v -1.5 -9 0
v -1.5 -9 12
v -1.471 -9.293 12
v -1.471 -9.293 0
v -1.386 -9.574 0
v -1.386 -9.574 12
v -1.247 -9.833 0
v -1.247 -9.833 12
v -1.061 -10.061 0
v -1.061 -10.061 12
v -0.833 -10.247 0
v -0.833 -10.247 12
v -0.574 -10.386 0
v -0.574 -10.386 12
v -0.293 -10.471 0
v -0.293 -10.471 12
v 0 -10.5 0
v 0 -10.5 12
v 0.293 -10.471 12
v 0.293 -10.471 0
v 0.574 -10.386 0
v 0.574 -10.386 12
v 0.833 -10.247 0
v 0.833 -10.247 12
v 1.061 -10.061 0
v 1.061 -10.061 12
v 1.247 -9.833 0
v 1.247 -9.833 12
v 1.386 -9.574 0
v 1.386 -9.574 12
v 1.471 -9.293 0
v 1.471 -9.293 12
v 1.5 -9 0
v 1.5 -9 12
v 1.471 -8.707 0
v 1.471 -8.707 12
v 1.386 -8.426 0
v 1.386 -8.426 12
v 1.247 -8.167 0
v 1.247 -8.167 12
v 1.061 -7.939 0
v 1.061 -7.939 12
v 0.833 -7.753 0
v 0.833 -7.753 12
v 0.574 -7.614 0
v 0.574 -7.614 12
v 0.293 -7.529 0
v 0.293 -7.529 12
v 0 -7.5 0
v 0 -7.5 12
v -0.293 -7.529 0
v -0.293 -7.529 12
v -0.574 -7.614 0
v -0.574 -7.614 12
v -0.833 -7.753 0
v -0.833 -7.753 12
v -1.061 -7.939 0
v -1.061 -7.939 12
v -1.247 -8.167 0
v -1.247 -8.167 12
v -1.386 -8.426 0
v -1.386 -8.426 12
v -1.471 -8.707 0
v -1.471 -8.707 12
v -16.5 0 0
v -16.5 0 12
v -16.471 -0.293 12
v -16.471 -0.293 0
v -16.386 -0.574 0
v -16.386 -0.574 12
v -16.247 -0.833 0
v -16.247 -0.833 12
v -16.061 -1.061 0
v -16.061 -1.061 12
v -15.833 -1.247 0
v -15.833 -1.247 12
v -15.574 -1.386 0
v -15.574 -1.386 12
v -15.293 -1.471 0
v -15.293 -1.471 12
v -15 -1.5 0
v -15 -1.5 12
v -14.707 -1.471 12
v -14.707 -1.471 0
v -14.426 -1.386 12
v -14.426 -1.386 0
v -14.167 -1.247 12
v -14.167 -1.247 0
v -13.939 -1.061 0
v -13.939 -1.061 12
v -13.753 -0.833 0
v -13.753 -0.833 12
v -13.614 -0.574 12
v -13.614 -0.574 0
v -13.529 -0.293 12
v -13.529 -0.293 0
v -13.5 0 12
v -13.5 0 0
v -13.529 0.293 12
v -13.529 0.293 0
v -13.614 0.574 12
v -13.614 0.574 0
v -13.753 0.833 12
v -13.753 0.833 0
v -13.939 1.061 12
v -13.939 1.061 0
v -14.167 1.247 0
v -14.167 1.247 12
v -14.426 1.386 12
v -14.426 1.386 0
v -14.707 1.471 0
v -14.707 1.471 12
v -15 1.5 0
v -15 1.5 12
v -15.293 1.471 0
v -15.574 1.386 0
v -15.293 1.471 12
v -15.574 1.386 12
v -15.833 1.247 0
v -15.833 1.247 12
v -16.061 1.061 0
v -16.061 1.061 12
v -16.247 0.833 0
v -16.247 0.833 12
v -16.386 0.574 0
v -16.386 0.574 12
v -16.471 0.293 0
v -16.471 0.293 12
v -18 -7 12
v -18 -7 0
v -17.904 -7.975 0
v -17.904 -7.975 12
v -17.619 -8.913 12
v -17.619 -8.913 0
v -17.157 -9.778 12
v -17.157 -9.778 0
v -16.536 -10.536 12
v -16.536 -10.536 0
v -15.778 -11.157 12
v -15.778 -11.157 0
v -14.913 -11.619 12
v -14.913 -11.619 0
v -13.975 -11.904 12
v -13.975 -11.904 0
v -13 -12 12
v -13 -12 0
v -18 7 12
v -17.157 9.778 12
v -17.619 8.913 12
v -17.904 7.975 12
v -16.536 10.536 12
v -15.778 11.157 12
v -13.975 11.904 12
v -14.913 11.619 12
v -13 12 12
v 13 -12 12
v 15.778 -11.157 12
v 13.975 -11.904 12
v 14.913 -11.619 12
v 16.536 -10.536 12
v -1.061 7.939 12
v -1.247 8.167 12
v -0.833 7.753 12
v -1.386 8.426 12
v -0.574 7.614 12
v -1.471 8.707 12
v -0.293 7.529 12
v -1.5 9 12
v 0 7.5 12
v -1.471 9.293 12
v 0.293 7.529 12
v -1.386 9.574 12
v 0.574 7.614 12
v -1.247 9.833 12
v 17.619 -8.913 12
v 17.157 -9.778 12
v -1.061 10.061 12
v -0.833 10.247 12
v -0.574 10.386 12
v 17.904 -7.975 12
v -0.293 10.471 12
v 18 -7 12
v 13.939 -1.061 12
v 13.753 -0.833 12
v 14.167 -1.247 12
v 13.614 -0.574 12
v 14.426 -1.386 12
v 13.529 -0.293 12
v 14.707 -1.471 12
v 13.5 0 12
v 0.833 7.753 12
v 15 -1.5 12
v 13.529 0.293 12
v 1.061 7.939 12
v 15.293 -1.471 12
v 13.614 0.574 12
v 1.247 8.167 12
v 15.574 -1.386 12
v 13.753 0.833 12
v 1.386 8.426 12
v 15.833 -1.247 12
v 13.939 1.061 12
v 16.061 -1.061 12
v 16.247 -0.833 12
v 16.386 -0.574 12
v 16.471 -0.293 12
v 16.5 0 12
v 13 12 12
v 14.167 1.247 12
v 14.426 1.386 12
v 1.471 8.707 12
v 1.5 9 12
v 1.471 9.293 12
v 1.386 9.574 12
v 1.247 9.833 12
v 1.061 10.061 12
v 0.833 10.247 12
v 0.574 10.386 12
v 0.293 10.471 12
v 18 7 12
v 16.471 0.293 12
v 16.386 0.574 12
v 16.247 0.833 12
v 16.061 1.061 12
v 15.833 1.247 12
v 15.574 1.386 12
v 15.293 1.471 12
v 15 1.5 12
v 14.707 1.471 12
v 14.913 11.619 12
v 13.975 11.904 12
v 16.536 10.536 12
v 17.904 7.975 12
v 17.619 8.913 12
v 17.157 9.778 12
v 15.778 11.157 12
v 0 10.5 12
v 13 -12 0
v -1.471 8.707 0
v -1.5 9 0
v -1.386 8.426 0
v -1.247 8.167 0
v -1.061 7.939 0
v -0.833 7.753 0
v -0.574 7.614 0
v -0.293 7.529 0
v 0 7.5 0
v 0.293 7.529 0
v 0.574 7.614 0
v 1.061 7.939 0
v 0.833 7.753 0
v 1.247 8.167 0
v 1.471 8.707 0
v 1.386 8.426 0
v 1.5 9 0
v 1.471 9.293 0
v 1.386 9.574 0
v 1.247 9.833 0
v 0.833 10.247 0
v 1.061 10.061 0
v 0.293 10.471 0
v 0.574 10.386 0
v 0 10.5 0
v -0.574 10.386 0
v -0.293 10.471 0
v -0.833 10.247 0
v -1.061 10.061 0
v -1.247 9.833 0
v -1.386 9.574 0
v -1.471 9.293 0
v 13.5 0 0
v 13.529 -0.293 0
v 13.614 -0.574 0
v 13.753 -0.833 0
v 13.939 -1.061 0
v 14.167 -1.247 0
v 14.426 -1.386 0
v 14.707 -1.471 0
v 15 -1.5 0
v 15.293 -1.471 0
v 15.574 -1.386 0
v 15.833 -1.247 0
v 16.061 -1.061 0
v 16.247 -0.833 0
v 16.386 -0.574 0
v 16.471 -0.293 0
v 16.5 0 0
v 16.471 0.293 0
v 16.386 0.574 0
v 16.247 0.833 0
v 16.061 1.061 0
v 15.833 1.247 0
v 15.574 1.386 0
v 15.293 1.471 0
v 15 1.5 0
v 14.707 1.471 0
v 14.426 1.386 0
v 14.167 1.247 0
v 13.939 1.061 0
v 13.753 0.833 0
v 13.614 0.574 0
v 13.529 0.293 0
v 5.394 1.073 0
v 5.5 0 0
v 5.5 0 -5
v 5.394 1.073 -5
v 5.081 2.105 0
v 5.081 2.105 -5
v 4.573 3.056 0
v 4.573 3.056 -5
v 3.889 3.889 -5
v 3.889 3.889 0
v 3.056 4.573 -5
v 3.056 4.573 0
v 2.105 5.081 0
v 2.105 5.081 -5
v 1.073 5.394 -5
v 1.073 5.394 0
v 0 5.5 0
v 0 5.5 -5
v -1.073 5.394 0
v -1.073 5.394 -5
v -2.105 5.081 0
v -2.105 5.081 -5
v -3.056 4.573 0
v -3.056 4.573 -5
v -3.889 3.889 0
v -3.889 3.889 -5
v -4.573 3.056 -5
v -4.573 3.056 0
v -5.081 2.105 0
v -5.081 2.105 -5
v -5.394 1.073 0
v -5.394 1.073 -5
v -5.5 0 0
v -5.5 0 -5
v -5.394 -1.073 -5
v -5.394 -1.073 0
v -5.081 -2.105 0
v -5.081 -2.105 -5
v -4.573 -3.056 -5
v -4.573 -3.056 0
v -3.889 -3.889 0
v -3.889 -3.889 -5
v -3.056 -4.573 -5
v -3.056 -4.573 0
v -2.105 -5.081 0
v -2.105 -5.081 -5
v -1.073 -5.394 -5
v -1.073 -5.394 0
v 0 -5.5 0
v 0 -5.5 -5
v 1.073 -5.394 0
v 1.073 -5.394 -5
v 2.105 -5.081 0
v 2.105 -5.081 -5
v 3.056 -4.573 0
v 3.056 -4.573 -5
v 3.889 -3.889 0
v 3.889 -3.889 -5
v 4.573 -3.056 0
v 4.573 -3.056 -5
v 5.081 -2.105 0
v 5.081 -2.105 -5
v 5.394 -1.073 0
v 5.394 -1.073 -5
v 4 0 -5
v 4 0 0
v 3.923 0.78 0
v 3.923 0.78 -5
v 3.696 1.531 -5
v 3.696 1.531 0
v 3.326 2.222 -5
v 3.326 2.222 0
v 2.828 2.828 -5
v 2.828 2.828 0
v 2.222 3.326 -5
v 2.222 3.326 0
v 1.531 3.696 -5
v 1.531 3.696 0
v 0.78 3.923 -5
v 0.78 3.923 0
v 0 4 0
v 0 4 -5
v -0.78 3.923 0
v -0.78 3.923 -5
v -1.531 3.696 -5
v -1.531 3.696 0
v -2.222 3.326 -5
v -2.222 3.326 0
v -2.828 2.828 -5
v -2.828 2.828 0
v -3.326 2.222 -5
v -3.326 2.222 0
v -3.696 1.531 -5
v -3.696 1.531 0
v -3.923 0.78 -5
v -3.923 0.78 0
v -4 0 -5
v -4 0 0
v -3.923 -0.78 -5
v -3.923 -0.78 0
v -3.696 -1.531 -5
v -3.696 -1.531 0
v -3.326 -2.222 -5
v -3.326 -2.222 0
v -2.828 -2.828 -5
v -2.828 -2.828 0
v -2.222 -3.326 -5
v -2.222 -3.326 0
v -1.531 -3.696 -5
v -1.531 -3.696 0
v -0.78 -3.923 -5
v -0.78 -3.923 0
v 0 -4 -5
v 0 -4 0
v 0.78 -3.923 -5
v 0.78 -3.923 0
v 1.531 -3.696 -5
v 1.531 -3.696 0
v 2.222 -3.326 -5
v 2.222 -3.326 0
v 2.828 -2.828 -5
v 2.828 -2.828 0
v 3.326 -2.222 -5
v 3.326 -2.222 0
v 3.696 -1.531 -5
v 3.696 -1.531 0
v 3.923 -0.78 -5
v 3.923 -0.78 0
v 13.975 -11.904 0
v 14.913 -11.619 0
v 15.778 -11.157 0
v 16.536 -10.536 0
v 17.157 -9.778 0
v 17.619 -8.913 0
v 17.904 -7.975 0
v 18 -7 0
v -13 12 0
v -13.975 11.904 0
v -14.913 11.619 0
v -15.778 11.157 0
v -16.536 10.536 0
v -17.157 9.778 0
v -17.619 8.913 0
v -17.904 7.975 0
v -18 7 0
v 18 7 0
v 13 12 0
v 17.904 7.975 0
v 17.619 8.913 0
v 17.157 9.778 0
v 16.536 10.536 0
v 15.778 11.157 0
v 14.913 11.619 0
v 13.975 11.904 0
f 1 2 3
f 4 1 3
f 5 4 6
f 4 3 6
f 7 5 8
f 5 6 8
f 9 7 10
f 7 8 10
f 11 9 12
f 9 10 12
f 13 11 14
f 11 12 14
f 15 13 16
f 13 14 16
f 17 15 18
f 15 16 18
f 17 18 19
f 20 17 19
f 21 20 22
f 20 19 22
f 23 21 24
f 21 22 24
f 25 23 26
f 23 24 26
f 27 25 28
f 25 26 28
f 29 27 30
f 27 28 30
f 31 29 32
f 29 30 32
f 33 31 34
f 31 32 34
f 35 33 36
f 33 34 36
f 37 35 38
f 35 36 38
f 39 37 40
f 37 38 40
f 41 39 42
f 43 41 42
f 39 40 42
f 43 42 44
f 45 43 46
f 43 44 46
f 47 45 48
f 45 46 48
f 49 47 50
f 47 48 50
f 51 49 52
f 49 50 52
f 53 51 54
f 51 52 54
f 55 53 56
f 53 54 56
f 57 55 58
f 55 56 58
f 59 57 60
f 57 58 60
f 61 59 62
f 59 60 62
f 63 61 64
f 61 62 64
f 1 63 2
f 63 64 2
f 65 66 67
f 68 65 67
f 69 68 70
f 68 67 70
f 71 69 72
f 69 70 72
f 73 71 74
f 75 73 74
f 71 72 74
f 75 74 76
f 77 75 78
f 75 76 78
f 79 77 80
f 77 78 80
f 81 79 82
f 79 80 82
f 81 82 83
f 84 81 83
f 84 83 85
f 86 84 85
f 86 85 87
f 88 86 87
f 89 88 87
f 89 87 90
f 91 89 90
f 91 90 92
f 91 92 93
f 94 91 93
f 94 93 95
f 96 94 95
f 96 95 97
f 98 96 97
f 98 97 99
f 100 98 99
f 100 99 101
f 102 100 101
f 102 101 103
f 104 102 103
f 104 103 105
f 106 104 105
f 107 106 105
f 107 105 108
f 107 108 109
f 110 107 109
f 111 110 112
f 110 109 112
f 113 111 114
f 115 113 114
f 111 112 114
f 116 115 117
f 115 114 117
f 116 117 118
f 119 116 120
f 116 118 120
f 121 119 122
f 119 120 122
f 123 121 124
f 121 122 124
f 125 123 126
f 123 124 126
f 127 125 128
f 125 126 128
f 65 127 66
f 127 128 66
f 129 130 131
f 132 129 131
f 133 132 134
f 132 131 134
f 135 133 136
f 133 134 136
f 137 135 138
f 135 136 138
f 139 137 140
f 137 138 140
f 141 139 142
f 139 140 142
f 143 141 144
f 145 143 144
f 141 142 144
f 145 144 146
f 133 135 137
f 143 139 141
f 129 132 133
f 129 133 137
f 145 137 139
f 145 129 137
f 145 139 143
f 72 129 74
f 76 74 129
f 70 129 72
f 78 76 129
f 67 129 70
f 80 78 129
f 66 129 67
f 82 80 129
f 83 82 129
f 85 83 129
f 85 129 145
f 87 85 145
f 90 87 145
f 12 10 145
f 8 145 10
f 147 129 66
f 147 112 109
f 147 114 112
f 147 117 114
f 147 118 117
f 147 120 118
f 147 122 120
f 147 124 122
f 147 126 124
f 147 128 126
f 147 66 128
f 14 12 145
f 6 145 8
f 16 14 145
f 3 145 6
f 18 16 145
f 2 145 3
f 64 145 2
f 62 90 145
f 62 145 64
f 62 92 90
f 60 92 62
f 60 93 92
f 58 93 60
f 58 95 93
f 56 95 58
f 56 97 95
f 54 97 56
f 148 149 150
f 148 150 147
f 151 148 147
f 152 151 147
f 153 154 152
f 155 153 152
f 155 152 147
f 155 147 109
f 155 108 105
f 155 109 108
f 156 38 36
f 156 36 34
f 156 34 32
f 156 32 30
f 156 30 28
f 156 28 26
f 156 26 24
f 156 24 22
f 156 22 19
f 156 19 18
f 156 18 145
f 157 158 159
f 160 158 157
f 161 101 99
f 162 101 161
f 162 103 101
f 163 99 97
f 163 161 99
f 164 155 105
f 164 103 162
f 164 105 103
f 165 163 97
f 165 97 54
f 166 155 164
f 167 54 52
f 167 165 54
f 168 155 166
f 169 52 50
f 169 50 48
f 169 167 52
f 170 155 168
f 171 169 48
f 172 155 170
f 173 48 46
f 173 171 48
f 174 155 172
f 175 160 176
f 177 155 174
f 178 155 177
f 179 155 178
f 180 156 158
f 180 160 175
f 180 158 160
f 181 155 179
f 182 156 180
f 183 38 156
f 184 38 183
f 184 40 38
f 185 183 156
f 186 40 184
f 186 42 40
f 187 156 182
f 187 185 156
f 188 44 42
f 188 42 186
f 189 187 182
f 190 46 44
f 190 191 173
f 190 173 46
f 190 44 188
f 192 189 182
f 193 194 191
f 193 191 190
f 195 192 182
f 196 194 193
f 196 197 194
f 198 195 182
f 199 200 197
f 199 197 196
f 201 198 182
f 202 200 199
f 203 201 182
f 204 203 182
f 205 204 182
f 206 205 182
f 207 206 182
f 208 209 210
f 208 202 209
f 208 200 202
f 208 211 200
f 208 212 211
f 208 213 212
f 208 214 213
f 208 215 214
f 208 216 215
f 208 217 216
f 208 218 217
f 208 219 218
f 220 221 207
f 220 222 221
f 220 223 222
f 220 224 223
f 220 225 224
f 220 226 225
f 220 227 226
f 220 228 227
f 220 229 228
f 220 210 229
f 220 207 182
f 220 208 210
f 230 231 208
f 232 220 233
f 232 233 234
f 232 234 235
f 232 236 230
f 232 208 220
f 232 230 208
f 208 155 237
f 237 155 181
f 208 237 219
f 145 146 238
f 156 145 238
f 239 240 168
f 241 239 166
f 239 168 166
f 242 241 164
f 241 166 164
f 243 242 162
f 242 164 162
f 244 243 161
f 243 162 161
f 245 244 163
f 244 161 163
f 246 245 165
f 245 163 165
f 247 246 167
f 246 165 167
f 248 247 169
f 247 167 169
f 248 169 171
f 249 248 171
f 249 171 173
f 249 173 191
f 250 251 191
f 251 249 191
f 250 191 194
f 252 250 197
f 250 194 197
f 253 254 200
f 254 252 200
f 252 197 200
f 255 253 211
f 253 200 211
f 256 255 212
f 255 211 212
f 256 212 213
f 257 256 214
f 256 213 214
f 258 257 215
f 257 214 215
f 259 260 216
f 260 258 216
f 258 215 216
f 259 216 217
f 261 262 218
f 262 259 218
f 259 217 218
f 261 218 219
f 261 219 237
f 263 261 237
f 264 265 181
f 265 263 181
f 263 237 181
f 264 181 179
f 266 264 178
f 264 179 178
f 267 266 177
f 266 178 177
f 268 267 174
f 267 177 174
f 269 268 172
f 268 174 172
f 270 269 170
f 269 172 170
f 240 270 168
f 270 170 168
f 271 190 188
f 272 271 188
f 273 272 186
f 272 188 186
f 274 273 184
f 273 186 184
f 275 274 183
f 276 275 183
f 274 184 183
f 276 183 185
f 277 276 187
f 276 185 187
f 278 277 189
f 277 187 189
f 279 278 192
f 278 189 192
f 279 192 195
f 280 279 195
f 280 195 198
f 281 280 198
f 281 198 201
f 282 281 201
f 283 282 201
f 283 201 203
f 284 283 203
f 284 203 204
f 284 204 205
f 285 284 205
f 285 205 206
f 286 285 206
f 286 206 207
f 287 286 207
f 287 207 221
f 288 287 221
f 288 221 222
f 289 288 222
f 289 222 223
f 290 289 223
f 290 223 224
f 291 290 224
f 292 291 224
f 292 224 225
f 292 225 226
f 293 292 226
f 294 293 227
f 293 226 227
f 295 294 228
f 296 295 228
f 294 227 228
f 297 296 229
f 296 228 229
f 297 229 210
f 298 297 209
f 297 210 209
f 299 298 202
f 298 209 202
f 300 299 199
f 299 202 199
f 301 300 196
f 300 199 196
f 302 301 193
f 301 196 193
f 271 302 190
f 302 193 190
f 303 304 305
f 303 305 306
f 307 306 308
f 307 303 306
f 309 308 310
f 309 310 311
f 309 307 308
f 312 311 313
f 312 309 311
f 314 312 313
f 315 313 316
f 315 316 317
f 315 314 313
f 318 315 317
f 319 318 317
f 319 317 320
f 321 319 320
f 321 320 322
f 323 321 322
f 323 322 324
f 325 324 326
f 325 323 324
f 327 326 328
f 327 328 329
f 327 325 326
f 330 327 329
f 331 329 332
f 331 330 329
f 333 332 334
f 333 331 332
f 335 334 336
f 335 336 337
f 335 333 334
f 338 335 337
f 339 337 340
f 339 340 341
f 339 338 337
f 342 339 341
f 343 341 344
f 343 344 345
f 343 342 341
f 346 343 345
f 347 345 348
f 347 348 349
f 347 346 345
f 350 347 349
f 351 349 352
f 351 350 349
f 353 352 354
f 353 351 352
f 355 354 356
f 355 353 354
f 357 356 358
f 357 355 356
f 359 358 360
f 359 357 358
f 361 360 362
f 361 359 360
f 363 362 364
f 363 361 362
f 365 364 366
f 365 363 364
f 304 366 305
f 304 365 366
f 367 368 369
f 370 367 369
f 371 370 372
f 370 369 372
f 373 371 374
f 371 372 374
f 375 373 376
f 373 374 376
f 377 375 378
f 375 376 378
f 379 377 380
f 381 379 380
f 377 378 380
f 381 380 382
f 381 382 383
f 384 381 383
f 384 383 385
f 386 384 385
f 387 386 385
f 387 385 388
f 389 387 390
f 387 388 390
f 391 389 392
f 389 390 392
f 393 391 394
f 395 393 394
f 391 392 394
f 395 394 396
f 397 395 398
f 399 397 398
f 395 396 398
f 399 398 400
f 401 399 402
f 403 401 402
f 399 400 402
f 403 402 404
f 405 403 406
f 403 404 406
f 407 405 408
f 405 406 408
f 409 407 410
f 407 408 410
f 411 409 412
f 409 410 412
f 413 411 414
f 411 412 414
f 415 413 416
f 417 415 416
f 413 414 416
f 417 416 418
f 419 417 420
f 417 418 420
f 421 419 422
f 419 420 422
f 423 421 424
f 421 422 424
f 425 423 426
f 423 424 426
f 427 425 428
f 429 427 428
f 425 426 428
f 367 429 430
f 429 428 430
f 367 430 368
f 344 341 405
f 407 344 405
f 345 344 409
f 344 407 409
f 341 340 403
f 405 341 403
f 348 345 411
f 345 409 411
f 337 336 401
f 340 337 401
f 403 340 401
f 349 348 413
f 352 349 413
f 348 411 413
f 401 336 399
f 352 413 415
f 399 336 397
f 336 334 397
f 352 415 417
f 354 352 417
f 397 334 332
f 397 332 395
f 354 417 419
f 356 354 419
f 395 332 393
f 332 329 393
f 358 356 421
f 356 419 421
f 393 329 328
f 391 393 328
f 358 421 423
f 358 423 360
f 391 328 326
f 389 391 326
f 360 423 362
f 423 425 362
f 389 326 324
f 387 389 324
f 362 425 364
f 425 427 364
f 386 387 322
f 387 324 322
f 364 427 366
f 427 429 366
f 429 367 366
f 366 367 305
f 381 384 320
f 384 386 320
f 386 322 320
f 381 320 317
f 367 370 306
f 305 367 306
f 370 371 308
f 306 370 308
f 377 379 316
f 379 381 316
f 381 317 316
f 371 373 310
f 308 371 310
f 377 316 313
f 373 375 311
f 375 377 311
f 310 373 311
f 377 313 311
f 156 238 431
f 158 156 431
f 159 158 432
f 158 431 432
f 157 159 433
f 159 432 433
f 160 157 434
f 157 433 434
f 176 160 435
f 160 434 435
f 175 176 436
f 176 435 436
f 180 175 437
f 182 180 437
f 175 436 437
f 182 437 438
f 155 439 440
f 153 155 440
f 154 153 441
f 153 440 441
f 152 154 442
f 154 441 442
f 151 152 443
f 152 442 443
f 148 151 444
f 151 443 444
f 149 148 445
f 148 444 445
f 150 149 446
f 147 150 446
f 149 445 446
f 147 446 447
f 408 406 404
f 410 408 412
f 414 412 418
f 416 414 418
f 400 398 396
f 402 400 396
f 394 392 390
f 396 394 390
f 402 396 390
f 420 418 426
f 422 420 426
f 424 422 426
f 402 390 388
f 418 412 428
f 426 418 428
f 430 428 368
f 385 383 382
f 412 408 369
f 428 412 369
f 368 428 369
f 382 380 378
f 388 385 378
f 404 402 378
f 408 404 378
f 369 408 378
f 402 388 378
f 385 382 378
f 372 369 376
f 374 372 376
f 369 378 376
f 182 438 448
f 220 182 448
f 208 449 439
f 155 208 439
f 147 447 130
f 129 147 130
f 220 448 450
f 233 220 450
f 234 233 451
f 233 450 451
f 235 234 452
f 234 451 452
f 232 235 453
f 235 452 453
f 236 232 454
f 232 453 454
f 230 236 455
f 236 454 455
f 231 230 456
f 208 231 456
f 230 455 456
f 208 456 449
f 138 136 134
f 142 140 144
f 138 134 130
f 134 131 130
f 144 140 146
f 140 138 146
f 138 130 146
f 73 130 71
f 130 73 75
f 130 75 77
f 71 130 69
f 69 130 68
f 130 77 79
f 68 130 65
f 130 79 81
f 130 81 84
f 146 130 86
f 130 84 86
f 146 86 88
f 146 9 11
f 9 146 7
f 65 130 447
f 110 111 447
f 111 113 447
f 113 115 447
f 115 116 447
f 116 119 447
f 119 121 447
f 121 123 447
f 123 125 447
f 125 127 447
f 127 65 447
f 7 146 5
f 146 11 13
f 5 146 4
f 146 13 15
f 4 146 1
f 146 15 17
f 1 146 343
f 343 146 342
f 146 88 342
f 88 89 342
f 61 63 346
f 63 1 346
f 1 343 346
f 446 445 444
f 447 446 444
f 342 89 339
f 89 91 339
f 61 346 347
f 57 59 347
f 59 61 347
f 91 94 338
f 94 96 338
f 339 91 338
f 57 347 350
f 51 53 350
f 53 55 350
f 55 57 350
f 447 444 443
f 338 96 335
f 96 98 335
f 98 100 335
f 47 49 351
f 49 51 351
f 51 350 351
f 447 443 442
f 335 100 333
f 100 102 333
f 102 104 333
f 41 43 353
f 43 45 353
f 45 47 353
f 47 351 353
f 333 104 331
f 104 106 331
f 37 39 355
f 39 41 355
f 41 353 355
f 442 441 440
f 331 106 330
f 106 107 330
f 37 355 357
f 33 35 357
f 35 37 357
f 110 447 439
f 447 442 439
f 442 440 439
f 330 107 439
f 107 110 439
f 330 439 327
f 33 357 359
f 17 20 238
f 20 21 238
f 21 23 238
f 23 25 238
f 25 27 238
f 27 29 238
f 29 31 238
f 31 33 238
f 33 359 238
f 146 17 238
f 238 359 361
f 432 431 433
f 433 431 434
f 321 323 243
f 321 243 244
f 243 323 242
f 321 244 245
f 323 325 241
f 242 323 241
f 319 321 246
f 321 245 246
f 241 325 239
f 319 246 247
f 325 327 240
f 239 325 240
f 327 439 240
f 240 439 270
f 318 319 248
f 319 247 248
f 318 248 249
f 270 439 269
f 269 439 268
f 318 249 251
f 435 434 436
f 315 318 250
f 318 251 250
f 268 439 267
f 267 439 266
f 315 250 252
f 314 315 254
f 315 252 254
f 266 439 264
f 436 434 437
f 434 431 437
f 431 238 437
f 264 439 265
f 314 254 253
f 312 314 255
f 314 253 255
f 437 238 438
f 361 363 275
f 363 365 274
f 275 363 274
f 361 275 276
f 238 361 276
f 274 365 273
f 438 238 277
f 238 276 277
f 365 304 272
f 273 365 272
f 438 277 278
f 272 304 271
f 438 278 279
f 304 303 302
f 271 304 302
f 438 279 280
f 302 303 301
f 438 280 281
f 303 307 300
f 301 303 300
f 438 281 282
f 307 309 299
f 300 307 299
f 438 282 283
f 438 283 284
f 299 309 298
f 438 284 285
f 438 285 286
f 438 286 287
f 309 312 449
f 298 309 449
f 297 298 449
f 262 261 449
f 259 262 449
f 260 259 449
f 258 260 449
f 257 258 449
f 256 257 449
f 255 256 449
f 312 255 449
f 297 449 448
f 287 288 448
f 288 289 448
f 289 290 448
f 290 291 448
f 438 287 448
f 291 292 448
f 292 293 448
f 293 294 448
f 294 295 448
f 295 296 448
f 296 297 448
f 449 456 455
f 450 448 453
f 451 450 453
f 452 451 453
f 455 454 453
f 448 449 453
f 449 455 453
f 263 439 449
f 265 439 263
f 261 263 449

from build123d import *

# Parameters (mm, degrees)
F0_R     = 5.5
F0_R_2   = 4
F1_DEPTH = 12
F2_D     = 3
F3_R     = 2.5
F3_R_2   = 1.5
F4_DEPTH = 12
F6_DEPTH = 5


# Not quite as in the source:
# - a feature of the source that left no trace in its solid (it failed there, or was rolled back) is left out


with BuildPart() as f1:
    # F0 (on Top) → F1 (new body)
    with BuildSketch(Plane.XY):
        with BuildLine():
            Line((13, 12), (-13, 12))
            ThreePointArc((-13, 12), (-16.5355339059, 10.5355339059), (-18, 7))
            Line((-18, 7), (-18, -7))
            ThreePointArc((-18, -7), (-16.5355339059, -10.5355339059), (-13, -12))
            Line((-13, -12), (13, -12))
            ThreePointArc((13, -12), (16.5355339059, -10.5355339059), (18, -7))
            Line((18, -7), (18, 7))
            ThreePointArc((18, 7), (16.5355339059, 10.5355339059), (13, 12))
        make_face()
        Circle(F0_R, mode=Mode.SUBTRACT)
        Circle(F0_R)
        Circle(F0_R_2, mode=Mode.SUBTRACT)
        Circle(F0_R_2)
    extrude(amount=F1_DEPTH)

    # F2 (through all)
    with Locations(Plane(origin=(0, 0, 0), x_dir=(1, 0, 0), z_dir=(0, 0, -1))):
        with Locations((15, 0), (0, 9), (0, -9), (-15, 0)):
            Hole(F2_D / 2)

    # F3 (on face) → F4 (join, through all)
    with BuildSketch(Plane.XY):
        with Locations((0, 9)):
            Circle(F3_R)
        with Locations((0, 9)):
            Circle(F3_R_2, mode=Mode.SUBTRACT)
        with Locations((0, -9)):
            Circle(F3_R)
        with Locations((0, -9)):
            Circle(F3_R_2, mode=Mode.SUBTRACT)
    extrude(amount=F4_DEPTH)

    # F0 (on Top) → F6 (join)
    with BuildSketch(Plane.XY):
        Circle(F0_R)
        Circle(F0_R_2, mode=Mode.SUBTRACT)
    extrude(amount=-F6_DEPTH)


solid = f1.part
